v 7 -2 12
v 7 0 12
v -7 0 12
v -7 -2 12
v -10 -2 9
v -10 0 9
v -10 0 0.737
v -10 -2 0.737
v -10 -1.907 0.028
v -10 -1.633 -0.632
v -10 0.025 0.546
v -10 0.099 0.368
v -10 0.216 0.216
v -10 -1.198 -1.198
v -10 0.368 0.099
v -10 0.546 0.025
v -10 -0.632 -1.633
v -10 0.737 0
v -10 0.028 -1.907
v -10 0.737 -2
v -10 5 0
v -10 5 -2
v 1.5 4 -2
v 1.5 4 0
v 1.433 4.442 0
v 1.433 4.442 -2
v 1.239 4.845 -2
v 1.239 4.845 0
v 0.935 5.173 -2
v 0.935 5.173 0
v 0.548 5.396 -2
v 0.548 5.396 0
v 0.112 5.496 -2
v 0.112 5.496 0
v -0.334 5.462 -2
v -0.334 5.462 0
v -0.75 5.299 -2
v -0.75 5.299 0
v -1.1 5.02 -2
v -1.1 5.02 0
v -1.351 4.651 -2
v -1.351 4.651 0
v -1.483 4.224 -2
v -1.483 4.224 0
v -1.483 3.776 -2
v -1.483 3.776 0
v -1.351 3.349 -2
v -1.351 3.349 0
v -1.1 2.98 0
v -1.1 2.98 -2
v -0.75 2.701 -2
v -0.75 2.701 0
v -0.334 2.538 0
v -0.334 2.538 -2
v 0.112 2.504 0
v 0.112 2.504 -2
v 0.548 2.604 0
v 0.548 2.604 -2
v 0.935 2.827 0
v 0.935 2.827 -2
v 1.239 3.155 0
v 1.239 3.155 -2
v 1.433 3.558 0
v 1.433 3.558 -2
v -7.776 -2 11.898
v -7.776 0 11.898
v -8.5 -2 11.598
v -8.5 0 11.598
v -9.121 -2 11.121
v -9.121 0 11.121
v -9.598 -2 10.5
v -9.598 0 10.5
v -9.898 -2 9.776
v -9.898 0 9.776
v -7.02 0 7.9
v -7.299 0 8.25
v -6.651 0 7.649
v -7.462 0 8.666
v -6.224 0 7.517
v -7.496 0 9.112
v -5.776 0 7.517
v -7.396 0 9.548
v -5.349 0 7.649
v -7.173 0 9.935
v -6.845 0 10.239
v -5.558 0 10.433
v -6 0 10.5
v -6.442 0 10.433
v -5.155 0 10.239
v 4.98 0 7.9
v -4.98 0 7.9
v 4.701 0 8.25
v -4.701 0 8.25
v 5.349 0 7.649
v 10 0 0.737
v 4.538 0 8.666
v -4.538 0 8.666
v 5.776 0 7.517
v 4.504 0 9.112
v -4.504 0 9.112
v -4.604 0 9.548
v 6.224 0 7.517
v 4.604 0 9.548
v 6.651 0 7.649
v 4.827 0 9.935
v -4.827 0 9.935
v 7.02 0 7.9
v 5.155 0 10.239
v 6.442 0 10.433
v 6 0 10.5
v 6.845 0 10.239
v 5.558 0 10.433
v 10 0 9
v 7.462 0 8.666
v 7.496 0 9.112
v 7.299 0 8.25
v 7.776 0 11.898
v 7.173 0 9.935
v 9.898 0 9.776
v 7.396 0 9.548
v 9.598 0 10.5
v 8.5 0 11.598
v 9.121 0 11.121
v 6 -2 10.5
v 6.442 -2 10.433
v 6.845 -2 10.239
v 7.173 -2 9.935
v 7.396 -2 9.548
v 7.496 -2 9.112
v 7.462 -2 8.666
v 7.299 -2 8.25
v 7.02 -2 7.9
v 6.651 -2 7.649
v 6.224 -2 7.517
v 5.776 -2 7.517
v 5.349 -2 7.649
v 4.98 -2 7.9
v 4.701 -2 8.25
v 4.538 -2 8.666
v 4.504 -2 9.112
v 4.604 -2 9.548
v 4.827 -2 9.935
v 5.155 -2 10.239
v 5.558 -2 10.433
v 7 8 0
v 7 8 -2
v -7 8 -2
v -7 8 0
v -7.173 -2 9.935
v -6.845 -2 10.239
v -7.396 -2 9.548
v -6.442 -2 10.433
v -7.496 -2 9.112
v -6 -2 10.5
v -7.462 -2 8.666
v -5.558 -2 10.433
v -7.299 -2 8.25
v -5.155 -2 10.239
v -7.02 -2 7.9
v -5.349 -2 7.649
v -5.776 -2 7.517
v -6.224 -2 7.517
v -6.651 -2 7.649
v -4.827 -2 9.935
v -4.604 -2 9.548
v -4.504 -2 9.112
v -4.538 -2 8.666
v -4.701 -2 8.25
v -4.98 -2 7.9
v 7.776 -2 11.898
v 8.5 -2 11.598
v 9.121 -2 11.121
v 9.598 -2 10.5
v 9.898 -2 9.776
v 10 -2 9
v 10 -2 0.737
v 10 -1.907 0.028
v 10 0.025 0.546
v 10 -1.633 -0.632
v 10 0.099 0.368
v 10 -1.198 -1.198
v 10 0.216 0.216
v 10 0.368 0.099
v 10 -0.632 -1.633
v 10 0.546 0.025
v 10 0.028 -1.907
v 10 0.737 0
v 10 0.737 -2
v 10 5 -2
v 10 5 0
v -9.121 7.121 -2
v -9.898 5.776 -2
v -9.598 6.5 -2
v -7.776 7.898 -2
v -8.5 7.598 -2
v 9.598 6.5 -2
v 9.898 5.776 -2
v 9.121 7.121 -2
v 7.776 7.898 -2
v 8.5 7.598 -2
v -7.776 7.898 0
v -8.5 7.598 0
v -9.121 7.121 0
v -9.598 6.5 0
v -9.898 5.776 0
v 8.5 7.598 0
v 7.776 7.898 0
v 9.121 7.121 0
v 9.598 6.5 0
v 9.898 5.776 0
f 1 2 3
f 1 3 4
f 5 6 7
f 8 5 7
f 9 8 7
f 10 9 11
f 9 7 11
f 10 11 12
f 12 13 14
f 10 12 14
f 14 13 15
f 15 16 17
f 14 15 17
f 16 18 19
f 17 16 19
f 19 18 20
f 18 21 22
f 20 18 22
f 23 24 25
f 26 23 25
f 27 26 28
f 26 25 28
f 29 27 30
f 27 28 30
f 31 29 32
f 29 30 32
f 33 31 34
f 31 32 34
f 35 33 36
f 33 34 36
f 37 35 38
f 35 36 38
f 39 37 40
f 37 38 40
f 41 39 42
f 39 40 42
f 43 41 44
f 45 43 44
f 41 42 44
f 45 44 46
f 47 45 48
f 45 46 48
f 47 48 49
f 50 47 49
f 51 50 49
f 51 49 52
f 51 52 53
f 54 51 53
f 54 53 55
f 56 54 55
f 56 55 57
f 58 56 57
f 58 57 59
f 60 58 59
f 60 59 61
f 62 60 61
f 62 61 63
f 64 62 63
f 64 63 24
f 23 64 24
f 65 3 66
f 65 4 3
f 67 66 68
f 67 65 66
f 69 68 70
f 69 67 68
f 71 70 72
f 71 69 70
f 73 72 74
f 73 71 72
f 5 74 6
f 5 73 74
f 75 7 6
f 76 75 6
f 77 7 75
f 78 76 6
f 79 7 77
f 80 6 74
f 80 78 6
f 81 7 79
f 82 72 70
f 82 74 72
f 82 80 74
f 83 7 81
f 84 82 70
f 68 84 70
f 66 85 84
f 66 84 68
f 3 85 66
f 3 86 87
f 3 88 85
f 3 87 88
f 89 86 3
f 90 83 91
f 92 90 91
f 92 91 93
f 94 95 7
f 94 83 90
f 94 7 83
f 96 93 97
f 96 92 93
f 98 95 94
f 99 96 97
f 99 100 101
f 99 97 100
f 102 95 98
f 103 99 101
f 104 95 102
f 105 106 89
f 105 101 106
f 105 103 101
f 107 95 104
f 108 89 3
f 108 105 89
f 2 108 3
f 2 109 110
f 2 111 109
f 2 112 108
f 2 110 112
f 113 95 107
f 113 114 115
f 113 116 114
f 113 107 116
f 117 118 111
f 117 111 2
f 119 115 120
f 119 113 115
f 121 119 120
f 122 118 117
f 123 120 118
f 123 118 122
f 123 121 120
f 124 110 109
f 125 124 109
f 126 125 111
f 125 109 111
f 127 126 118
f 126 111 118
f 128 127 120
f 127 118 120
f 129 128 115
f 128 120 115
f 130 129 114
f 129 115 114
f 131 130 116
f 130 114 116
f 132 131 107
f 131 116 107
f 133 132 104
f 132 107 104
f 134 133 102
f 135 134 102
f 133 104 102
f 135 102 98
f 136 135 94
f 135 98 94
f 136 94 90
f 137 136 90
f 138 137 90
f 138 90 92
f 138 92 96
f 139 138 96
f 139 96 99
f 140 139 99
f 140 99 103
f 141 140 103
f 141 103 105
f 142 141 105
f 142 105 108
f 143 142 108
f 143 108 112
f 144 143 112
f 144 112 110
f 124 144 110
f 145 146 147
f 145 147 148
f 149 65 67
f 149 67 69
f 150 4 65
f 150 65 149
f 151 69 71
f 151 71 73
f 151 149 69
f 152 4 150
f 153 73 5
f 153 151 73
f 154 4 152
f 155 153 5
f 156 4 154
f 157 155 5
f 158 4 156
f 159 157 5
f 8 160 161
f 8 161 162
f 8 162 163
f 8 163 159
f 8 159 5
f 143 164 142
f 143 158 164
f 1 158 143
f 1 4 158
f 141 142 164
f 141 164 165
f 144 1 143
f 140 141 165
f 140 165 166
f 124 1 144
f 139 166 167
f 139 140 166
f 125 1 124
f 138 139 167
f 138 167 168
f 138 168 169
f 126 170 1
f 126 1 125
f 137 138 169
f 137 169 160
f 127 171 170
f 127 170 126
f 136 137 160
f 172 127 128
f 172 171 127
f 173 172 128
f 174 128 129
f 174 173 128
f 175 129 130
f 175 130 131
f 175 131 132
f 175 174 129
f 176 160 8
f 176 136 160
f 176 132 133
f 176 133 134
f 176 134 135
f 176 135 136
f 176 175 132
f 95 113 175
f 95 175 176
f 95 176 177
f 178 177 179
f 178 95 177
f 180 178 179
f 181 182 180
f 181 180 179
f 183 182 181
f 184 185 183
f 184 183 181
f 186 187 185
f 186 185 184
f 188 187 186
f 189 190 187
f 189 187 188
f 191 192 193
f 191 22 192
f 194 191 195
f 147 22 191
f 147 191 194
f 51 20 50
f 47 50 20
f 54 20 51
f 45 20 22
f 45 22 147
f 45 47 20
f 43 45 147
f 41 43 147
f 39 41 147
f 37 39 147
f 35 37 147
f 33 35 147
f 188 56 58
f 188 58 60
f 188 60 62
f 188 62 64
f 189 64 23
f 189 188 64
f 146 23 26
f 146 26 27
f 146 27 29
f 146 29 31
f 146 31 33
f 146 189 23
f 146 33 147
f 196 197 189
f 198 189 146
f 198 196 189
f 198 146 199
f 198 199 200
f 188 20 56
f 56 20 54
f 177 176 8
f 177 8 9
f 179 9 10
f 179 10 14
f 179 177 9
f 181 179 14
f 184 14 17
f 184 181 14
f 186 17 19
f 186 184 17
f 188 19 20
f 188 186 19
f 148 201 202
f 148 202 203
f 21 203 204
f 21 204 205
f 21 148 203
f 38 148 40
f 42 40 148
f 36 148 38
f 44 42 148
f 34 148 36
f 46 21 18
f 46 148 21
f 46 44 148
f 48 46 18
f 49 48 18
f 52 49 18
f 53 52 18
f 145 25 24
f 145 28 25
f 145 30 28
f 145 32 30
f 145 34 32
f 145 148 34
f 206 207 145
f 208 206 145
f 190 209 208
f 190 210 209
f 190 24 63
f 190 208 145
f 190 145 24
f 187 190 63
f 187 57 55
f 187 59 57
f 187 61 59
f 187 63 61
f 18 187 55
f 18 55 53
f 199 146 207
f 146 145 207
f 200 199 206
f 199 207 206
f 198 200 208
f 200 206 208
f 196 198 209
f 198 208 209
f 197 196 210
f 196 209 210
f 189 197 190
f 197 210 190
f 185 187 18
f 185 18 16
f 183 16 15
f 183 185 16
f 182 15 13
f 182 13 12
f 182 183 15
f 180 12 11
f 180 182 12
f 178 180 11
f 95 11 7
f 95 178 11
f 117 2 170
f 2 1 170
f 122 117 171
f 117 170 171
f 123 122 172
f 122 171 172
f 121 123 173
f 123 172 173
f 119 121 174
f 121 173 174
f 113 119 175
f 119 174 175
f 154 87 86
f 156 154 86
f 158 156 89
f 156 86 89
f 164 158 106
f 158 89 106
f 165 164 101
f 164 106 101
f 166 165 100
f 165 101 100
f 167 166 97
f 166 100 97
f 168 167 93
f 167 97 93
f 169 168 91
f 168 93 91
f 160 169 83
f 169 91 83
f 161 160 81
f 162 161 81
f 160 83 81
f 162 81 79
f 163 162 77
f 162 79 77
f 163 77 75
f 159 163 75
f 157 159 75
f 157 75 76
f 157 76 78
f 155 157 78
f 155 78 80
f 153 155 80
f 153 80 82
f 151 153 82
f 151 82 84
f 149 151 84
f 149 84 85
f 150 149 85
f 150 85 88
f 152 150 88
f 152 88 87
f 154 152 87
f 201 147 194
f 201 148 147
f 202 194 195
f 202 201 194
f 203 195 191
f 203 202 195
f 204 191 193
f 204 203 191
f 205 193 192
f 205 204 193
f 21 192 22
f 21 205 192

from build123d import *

# Parameters (mm, degrees)
BASE_FLANGE1_DEPTH = 10
FILLET1_R          = 3
SKETCH6_R          = 1.5
CUT_EXTRUDE1_DEPTH = 10
SKETCH7_R          = 1.5
CUT_EXTRUDE2_DEPTH = 10


# Sheet-metal steps are written as plain solids
with BuildPart() as part:
    # Sketch1 → Base-Flange1 (new, symmetric)
    with BuildSketch(Plane(origin=(0, 0, 0), x_dir=(0, 0, -1), z_dir=(1, 0, 0))):
        with BuildLine():
            Line((0, 8), (0, 0.7366))
            ThreePointArc((0, 0.7366), (-0.215745145, 0.215745145), (-0.7366, 0))
            Line((-0.7366, 0), (-12, 0))
            Line((-12, 0), (-12, -2))
            Line((-12, -2), (-0.7366, -2))
            ThreePointArc((-0.7366, -2), (1.198468417, -1.198468417), (2, 0.7366))
            Line((2, 0.7366), (2, 8))
            Line((2, 8), (0, 8))
        make_face()
    extrude(amount=BASE_FLANGE1_DEPTH, both=True)

    # Fillet1
    fillet1_edges = [part.edges().sort_by_distance(p)[0] for p in [
        (10, 8, -1),
        (10, -1, 12),
        (-10, 8, -1),
        (-10, -1, 12),
    ]]
    fillet(fillet1_edges, radius=FILLET1_R)

    # Sketch6 → Cut-Extrude1 (cut)
    with BuildSketch(Plane(origin=(0, 0, 0), x_dir=(1, 0, 0), z_dir=(0, 1, 0))):
        with Locations(Location((6, -9, 0), (0, 0, 270))):
            Circle(SKETCH6_R)
        with Locations(Location((-6, -9, 0), (0, 0, 270))):
            Circle(SKETCH6_R)
    extrude(amount=-CUT_EXTRUDE1_DEPTH, mode=Mode.SUBTRACT)

    # Sketch7 → Cut-Extrude2 (cut)
    with BuildSketch(Plane.XY):
        with Locations((0, 4)):
            Circle(SKETCH7_R)
    extrude(amount=-CUT_EXTRUDE2_DEPTH, mode=Mode.SUBTRACT)


solid = part.part
